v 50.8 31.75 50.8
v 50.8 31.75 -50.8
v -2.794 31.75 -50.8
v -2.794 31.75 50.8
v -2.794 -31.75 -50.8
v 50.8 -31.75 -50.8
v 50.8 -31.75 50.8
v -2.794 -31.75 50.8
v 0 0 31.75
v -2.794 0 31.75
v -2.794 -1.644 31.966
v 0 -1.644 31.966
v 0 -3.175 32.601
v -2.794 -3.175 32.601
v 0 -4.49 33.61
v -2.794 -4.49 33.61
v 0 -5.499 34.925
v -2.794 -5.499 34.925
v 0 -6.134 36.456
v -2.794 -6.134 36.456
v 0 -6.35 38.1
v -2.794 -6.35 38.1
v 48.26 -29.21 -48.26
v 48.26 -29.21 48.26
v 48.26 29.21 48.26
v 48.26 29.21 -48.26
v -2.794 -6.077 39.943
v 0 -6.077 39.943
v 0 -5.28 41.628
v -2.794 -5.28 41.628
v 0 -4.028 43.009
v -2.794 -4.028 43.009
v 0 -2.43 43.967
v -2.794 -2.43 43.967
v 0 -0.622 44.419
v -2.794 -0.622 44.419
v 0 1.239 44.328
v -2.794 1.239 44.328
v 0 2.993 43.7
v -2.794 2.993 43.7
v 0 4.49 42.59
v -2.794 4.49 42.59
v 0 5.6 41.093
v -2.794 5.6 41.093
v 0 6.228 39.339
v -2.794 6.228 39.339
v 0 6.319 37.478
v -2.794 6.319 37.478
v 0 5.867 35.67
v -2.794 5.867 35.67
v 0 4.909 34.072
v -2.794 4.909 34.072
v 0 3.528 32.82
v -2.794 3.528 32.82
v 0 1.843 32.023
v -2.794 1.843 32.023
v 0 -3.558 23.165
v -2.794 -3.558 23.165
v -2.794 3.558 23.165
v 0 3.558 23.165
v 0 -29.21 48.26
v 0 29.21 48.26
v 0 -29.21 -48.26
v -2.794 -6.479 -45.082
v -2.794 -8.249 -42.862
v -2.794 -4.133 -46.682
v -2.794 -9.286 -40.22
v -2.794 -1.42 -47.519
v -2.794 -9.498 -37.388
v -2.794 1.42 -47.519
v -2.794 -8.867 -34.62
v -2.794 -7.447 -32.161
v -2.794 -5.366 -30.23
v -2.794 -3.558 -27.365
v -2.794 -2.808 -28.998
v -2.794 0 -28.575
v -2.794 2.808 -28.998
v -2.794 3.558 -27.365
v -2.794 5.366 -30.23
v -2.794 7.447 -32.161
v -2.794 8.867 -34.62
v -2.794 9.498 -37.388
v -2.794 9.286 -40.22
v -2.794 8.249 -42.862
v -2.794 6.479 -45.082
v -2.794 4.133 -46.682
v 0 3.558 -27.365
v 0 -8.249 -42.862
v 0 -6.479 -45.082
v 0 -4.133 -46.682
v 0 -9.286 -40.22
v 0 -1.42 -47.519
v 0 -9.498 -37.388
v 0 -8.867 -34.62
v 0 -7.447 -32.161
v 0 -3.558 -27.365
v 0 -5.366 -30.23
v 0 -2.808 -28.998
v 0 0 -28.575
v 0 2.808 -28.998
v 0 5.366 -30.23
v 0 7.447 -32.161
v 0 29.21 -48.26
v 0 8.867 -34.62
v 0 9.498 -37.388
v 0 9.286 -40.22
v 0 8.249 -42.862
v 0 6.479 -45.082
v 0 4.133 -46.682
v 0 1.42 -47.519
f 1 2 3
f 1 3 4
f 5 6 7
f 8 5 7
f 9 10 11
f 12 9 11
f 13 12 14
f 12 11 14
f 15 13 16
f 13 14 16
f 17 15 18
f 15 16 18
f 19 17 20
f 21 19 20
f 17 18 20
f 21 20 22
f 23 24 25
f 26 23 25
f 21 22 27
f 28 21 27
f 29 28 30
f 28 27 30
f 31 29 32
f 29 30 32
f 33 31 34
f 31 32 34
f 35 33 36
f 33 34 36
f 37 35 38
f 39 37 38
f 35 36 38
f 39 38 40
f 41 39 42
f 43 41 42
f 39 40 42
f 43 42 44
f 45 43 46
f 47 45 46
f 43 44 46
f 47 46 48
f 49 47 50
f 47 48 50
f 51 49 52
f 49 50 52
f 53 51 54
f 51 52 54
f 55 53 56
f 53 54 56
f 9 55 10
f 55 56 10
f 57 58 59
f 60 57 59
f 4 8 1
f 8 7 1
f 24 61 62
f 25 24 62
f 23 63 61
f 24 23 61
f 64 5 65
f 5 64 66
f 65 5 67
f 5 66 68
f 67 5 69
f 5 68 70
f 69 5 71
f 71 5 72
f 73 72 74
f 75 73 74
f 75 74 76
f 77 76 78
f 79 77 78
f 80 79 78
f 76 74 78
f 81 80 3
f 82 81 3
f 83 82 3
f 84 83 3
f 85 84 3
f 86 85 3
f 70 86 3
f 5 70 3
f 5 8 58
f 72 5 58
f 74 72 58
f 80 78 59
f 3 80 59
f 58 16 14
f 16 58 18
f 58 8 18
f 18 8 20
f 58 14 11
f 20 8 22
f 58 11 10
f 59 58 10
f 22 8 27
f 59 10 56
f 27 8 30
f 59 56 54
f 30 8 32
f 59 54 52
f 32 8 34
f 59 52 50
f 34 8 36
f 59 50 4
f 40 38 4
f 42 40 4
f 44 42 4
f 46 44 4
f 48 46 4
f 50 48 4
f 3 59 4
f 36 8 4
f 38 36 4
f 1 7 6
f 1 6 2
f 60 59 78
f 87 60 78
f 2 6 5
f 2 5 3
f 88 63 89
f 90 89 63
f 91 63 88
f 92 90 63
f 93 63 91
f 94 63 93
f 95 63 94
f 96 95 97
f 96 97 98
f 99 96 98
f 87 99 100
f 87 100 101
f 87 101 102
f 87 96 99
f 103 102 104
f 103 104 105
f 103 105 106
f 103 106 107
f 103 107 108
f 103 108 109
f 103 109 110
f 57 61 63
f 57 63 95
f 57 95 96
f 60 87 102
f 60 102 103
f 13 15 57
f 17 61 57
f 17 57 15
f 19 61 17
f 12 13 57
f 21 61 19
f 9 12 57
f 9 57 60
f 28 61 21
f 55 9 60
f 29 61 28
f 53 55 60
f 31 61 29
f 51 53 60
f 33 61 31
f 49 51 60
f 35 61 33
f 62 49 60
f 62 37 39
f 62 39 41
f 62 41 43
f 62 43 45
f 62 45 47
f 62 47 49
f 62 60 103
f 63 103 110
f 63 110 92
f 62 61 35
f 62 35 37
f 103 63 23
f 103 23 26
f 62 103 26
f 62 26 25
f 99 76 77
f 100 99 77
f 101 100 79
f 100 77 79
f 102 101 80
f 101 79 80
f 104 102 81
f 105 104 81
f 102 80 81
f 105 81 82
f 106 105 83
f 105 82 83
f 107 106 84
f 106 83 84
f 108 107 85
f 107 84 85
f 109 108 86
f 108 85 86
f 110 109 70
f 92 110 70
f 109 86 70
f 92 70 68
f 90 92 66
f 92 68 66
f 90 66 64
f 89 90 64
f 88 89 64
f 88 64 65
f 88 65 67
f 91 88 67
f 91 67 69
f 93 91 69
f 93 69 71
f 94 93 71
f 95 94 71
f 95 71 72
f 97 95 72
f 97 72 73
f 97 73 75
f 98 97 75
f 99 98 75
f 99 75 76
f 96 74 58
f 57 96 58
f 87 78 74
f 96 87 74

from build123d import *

# Parameters (mm, degrees)
F0_W     = 63.5
F0_H     = 101.6
F1_DEPTH = 50.8
F2_T     = -2.54
F3_W     = 63.5
F3_H     = 101.6
F4_DEPTH = 2.794
F7_DEPTH = 25.4
F8_DEPTH = 25.4


with BuildPart() as f1:
    # F0 (on Right) → F1 (new body)
    with BuildSketch(Plane.YZ):
        Rectangle(F0_W, F0_H)
    extrude(amount=F1_DEPTH)

    # F2
    f2_openings = [f1.faces().sort_by_distance(p)[0] for p in [
        (0, 0, 0),
    ]]
    offset(amount=F2_T, openings=f2_openings)

    # F3 (on Right) → F4 (join)
    with BuildSketch(Plane.YZ):
        Rectangle(F3_W, F3_H)
    extrude(amount=-F4_DEPTH)

    # F5 (on face) → F7 (cut)
    with BuildSketch(Plane(origin=(-2.794, 0, 0), x_dir=(0, -1, 0), z_dir=(-1, 0, 0))):
        with BuildLine():
            ThreePointArc((6.35, 38.1), (-4.4901280605, 42.5901280605), (0, 31.75))
            ThreePointArc((0, 31.75), (4.4901280605, 33.6098719395), (6.35, 38.1))
        make_face()
        with BuildLine():
            ThreePointArc((9.525, -38.1), (6.7351920908, -31.3648079092), (0, -28.575))
            ThreePointArc((0, -28.575), (-6.7351920908, -44.8351920908), (9.525, -38.1))
        make_face()
    extrude(amount=-F7_DEPTH, mode=Mode.SUBTRACT)

    # F6 (on face) → F8 (cut)
    with BuildSketch(Plane(origin=(-2.794, 0, 0), x_dir=(0, -1, 0), z_dir=(-1, 0, 0))):
        Polygon((0, 23.1647733599), (-3.5581812263, 23.1647733599), (-3.5581812263, -27.3652244359), (0, -27.3652244359), (0, 0), align=None)
        Polygon((3.5581812263, 23.1647733599), (0, 23.1647733599), (0, 0), (0, -27.3652244359), (3.5581812263, -27.3652244359), align=None)
    extrude(amount=-F8_DEPTH, mode=Mode.SUBTRACT)


solid = f1.part
